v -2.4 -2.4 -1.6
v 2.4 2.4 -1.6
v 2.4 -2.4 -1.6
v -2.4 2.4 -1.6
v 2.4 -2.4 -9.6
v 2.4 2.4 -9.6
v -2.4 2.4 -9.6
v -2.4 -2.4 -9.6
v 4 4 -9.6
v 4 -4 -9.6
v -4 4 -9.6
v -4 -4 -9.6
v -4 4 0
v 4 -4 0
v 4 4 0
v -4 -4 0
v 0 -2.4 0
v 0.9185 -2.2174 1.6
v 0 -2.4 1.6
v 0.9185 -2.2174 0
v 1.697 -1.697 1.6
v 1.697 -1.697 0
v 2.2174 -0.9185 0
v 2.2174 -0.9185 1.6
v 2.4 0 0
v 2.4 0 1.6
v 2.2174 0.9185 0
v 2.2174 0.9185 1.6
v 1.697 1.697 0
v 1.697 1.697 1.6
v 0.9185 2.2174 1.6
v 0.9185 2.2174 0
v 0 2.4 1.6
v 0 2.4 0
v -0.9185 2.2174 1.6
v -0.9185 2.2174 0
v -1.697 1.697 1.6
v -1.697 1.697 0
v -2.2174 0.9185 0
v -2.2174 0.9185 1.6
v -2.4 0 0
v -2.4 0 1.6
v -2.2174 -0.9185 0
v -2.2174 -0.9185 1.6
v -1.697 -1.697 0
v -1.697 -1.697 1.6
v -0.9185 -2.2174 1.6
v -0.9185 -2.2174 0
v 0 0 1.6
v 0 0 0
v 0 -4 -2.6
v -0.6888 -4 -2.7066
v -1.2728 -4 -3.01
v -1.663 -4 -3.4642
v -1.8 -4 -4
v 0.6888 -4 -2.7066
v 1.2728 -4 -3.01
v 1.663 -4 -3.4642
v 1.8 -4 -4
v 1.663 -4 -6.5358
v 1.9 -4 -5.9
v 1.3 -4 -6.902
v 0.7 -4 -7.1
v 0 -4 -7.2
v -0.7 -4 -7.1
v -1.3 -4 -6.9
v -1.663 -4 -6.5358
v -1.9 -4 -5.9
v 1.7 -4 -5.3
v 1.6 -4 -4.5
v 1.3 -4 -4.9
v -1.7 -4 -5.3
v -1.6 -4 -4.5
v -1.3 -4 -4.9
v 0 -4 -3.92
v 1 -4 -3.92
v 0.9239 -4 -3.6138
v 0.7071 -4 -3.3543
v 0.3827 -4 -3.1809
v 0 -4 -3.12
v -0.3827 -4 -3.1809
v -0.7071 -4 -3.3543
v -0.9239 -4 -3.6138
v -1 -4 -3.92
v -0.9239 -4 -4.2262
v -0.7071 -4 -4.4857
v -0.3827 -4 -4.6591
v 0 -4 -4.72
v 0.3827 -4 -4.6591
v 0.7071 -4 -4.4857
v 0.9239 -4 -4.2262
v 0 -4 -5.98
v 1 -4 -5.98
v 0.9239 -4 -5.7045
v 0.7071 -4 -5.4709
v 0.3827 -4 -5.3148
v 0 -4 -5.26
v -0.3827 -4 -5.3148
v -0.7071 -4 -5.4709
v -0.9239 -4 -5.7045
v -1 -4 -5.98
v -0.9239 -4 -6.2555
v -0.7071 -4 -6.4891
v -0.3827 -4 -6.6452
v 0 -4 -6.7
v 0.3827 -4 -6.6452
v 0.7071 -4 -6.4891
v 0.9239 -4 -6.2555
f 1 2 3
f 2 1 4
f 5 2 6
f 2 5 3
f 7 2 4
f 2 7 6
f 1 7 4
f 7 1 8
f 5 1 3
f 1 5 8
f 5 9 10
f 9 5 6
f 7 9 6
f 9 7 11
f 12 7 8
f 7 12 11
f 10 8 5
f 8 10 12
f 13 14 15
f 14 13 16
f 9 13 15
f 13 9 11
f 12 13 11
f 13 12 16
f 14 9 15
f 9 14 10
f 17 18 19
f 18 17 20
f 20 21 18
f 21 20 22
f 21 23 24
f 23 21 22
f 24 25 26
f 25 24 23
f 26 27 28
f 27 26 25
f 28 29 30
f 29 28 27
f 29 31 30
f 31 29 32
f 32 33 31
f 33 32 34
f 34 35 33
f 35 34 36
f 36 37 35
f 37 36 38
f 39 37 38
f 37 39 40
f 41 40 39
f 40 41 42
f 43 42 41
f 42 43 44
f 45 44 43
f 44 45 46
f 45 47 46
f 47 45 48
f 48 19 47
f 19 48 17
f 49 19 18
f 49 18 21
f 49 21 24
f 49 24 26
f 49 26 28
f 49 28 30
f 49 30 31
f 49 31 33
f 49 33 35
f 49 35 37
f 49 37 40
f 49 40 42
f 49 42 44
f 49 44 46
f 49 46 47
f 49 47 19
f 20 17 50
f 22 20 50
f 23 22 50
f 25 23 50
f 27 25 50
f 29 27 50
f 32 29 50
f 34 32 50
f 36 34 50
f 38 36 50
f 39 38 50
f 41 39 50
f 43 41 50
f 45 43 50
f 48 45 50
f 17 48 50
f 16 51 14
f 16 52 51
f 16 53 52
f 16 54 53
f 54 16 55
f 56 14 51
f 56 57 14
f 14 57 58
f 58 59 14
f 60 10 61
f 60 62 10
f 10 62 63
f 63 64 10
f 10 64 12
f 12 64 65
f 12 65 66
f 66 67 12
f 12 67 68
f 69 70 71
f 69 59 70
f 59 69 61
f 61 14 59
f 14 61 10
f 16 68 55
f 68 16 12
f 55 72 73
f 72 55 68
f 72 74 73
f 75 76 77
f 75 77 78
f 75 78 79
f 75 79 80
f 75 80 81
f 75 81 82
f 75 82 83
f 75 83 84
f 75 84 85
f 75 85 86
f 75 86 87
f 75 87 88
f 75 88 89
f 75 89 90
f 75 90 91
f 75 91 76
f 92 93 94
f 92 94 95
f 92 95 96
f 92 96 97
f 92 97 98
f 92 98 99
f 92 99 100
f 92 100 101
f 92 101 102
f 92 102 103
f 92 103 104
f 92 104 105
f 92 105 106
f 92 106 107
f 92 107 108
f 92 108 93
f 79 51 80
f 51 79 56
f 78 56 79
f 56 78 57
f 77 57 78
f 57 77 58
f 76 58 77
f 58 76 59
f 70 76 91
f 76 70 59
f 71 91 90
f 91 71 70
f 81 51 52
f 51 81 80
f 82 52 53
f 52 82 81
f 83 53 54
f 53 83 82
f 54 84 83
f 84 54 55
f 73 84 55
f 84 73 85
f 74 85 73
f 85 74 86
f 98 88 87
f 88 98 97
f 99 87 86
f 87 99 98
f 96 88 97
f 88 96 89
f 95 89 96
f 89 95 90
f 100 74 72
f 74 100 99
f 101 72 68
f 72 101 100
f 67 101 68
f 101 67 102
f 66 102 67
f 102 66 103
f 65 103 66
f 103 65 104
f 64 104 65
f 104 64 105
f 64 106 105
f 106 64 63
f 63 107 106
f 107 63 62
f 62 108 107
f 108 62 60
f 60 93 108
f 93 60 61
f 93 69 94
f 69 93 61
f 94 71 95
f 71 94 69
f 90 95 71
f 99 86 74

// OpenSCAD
// file: ../p/4-4edge.scad
use <../lib.scad>
function ldraw_lib__4_4edge() = [
// 0 Circle 1.0
// 0 Name: 4-4edge.dat
// 0 Author: James Jessiman
// 0 !LDRAW_ORG Primitive UPDATE 2017-01
// 0 !LICENSE Licensed under CC BY 2.0 and CC BY 4.0 : see CAreadme.txt
// 
// 0 BFC CERTIFY CCW
  [0,"BFC","CERTIFY"],
  [0,"BFC","CCW"],
// 
// 0 !HISTORY 1998-12-15 [PTadmin] Official Update 1998-10
// 0 !HISTORY 2005-12-28 [PTadmin] Official Update 2005-01
// 0 !HISTORY 2007-06-24 [PTadmin] Header formatted for Contributor Agreement
// 0 !HISTORY 2008-07-01 [PTadmin] Official Update 2008-01
// 0 !HISTORY 2017-01-15 [Steffen] BFCed
// 0 !HISTORY 2017-12-30 [PTadmin] Official Update 2017-01
// 
// 
// 2 24 1 0 0 0.9239 0 0.3827
  [2,24,1,0,0,0.9239,0,0.3827],
// 2 24 0.9239 0 0.3827 0.7071 0 0.7071
  [2,24,0.9239,0,0.3827,0.7071,0,0.7071],
// 2 24 0.7071 0 0.7071 0.3827 0 0.9239
  [2,24,0.7071,0,0.7071,0.3827,0,0.9239],
// 2 24 0.3827 0 0.9239 0 0 1
  [2,24,0.3827,0,0.9239,0,0,1],
// 2 24 0 0 1 -0.3827 0 0.9239
  [2,24,0,0,1,-0.3827,0,0.9239],
// 2 24 -0.3827 0 0.9239 -0.7071 0 0.7071
  [2,24,-0.3827,0,0.9239,-0.7071,0,0.7071],
// 2 24 -0.7071 0 0.7071 -0.9239 0 0.3827
  [2,24,-0.7071,0,0.7071,-0.9239,0,0.3827],
// 2 24 -0.9239 0 0.3827 -1 0 -0
  [2,24,-0.9239,0,0.3827,-1,0,-0],
// 2 24 -1 0 -0 -0.9239 0 -0.3827
  [2,24,-1,0,-0,-0.9239,0,-0.3827],
// 2 24 -0.9239 0 -0.3827 -0.7071 0 -0.7071
  [2,24,-0.9239,0,-0.3827,-0.7071,0,-0.7071],
// 2 24 -0.7071 0 -0.7071 -0.3827 0 -0.9239
  [2,24,-0.7071,0,-0.7071,-0.3827,0,-0.9239],
// 2 24 -0.3827 0 -0.9239 0 0 -1
  [2,24,-0.3827,0,-0.9239,0,0,-1],
// 2 24 0 0 -1 0.3827 0 -0.9239
  [2,24,0,0,-1,0.3827,0,-0.9239],
// 2 24 0.3827 0 -0.9239 0.7071 0 -0.7071
  [2,24,0.3827,0,-0.9239,0.7071,0,-0.7071],
// 2 24 0.7071 0 -0.7071 0.9239 0 -0.3827
  [2,24,0.7071,0,-0.7071,0.9239,0,-0.3827],
// 2 24 0.9239 0 -0.3827 1 0 0
  [2,24,0.9239,0,-0.3827,1,0,0],
];
module ldraw_lib__4_4edge(step=0, col=false, unit=2/5, alt=false, line=0.2, solid=!$preview)
    makepoly(ldraw_lib__4_4edge(), step=step, col=col, unit=unit, alt=alt, line=line, solid=solid);
ldraw_lib__4_4edge(line=0.2);
// file: ../p/4-4cyli.scad
use <../lib.scad>
$fa=1; $fs=0.2;
function ldraw_lib__4_4cyli(realsolid=false) = [
// 0 Cylinder 1.0
// 0 Name: 4-4cyli.dat
// 0 Author: James Jessiman
// 0 !LDRAW_ORG Primitive UPDATE 2005-01
// 0 !LICENSE Licensed under CC BY 2.0 and CC BY 4.0 : see CAreadme.txt
// 
// 0 BFC CERTIFY CCW
  [0,"BFC","CERTIFY"],
  [0,"BFC","CCW"],
// 
// 0 !HISTORY 1998-12-15 [PTadmin] Official Update 1998-10
// 0 !HISTORY 2002-03-23 [sbliss] Added BFC statement; merged headers from files in distributions LDraw 0.27 and Complete.
// 0 !HISTORY 2002-04-25 [PTadmin] Official Update 2002-02
// 0 !HISTORY 2004-12-14 [guyvivan] BFC CCW
// 0 !HISTORY 2005-12-28 [PTadmin] Official Update 2005-01
// 0 !HISTORY 2007-06-24 [PTadmin] Header formatted for Contributor Agreement
// 0 !HISTORY 2008-07-01 [PTadmin] Official Update 2008-01
// 
// 
// 4 16 1 1 0 0.9239 1 0.3827 0.9239 0 0.3827 1 0 0
  [4,16,1,1,0,0.9239,1,0.3827,0.9239,0,0.3827,1,0,0],
// 5 24 1 0 0 1 1 0 0.9239 0 0.3827 0.9239 0 -0.3827
  [5,24,1,0,0,1,1,0,0.9239,0,0.3827,0.9239,0,-0.3827],
// 4 16 0.9239 1 0.3827 0.7071 1 0.7071 0.7071 0 0.7071 0.9239 0 0.3827
  [4,16,0.9239,1,0.3827,0.7071,1,0.7071,0.7071,0,0.7071,0.9239,0,0.3827],
// 5 24 0.9239 0 0.3827 0.9239 1 0.3827 0.7071 0 0.7071 1 0 0
  [5,24,0.9239,0,0.3827,0.9239,1,0.3827,0.7071,0,0.7071,1,0,0],
// 4 16 0.7071 1 0.7071 0.3827 1 0.9239 0.3827 0 0.9239 0.7071 0 0.7071
  [4,16,0.7071,1,0.7071,0.3827,1,0.9239,0.3827,0,0.9239,0.7071,0,0.7071],
// 5 24 0.7071 0 0.7071 0.7071 1 0.7071 0.3827 0 0.9239 0.9239 0 0.3827
  [5,24,0.7071,0,0.7071,0.7071,1,0.7071,0.3827,0,0.9239,0.9239,0,0.3827],
// 4 16 0.3827 1 0.9239 0 1 1 0 0 1 0.3827 0 0.9239
  [4,16,0.3827,1,0.9239,0,1,1,0,0,1,0.3827,0,0.9239],
// 5 24 0.3827 0 0.9239 0.3827 1 0.9239 0 0 1 0.7071 0 0.7071
  [5,24,0.3827,0,0.9239,0.3827,1,0.9239,0,0,1,0.7071,0,0.7071],
// 4 16 0 1 1 -0.3827 1 0.9239 -0.3827 0 0.9239 0 0 1
  [4,16,0,1,1,-0.3827,1,0.9239,-0.3827,0,0.9239,0,0,1],
// 5 24 0 0 1 0 1 1 -0.3827 0 0.9239 0.3827 0 0.9239
  [5,24,0,0,1,0,1,1,-0.3827,0,0.9239,0.3827,0,0.9239],
// 4 16 -0.3827 1 0.9239 -0.7071 1 0.7071 -0.7071 0 0.7071 -0.3827 0 0.9239
  [4,16,-0.3827,1,0.9239,-0.7071,1,0.7071,-0.7071,0,0.7071,-0.3827,0,0.9239],
// 5 24 -0.3827 0 0.9239 -0.3827 1 0.9239 -0.7071 0 0.7071 0 0 1
  [5,24,-0.3827,0,0.9239,-0.3827,1,0.9239,-0.7071,0,0.7071,0,0,1],
// 4 16 -0.7071 1 0.7071 -0.9239 1 0.3827 -0.9239 0 0.3827 -0.7071 0 0.7071
  [4,16,-0.7071,1,0.7071,-0.9239,1,0.3827,-0.9239,0,0.3827,-0.7071,0,0.7071],
// 5 24 -0.7071 0 0.7071 -0.7071 1 0.7071 -0.9239 0 0.3827 -0.3827 0 0.9239
  [5,24,-0.7071,0,0.7071,-0.7071,1,0.7071,-0.9239,0,0.3827,-0.3827,0,0.9239],
// 4 16 -0.9239 1 0.3827 -1 1 0 -1 0 0 -0.9239 0 0.3827
  [4,16,-0.9239,1,0.3827,-1,1,0,-1,0,0,-0.9239,0,0.3827],
// 5 24 -0.9239 0 0.3827 -0.9239 1 0.3827 -1 0 0 -0.7071 0 0.7071
  [5,24,-0.9239,0,0.3827,-0.9239,1,0.3827,-1,0,0,-0.7071,0,0.7071],
// 4 16 -1 1 0 -0.9239 1 -0.3827 -0.9239 0 -0.3827 -1 0 0
  [4,16,-1,1,0,-0.9239,1,-0.3827,-0.9239,0,-0.3827,-1,0,0],
// 5 24 -1 0 0 -1 1 0 -0.9239 0 -0.3827 -0.9239 0 0.3827
  [5,24,-1,0,0,-1,1,0,-0.9239,0,-0.3827,-0.9239,0,0.3827],
// 4 16 -0.9239 1 -0.3827 -0.7071 1 -0.7071 -0.7071 0 -0.7071 -0.9239 0 -0.3827
  [4,16,-0.9239,1,-0.3827,-0.7071,1,-0.7071,-0.7071,0,-0.7071,-0.9239,0,-0.3827],
// 5 24 -0.9239 0 -0.3827 -0.9239 1 -0.3827 -0.7071 0 -0.7071 -1 0 0
  [5,24,-0.9239,0,-0.3827,-0.9239,1,-0.3827,-0.7071,0,-0.7071,-1,0,0],
// 4 16 -0.7071 1 -0.7071 -0.3827 1 -0.9239 -0.3827 0 -0.9239 -0.7071 0 -0.7071
  [4,16,-0.7071,1,-0.7071,-0.3827,1,-0.9239,-0.3827,0,-0.9239,-0.7071,0,-0.7071],
// 5 24 -0.7071 0 -0.7071 -0.7071 1 -0.7071 -0.3827 0 -0.9239 -0.9239 0 -0.3827
  [5,24,-0.7071,0,-0.7071,-0.7071,1,-0.7071,-0.3827,0,-0.9239,-0.9239,0,-0.3827],
// 4 16 -0.3827 1 -0.9239 0 1 -1 0 0 -1 -0.3827 0 -0.9239
  [4,16,-0.3827,1,-0.9239,0,1,-1,0,0,-1,-0.3827,0,-0.9239],
// 5 24 -0.3827 0 -0.9239 -0.3827 1 -0.9239 0 0 -1 -0.7071 0 -0.7071
  [5,24,-0.3827,0,-0.9239,-0.3827,1,-0.9239,0,0,-1,-0.7071,0,-0.7071],
// 4 16 0 1 -1 0.3827 1 -0.9239 0.3827 0 -0.9239 0 0 -1
  [4,16,0,1,-1,0.3827,1,-0.9239,0.3827,0,-0.9239,0,0,-1],
// 5 24 0 0 -1 0 1 -1 0.3827 0 -0.9239 -0.3827 0 -0.9239
  [5,24,0,0,-1,0,1,-1,0.3827,0,-0.9239,-0.3827,0,-0.9239],
// 4 16 0.3827 1 -0.9239 0.7071 1 -0.7071 0.7071 0 -0.7071 0.3827 0 -0.9239
  [4,16,0.3827,1,-0.9239,0.7071,1,-0.7071,0.7071,0,-0.7071,0.3827,0,-0.9239],
// 5 24 0.3827 0 -0.9239 0.3827 1 -0.9239 0.7071 0 -0.7071 0 0 -1
  [5,24,0.3827,0,-0.9239,0.3827,1,-0.9239,0.7071,0,-0.7071,0,0,-1],
// 4 16 0.7071 1 -0.7071 0.9239 1 -0.3827 0.9239 0 -0.3827 0.7071 0 -0.7071
  [4,16,0.7071,1,-0.7071,0.9239,1,-0.3827,0.9239,0,-0.3827,0.7071,0,-0.7071],
// 5 24 0.7071 0 -0.7071 0.7071 1 -0.7071 0.9239 0 -0.3827 0.3827 0 -0.9239
  [5,24,0.7071,0,-0.7071,0.7071,1,-0.7071,0.9239,0,-0.3827,0.3827,0,-0.9239],
// 4 16 0.9239 1 -0.3827 1 1 0 1 0 0 0.9239 0 -0.3827
  [4,16,0.9239,1,-0.3827,1,1,0,1,0,0,0.9239,0,-0.3827],
// 5 24 0.9239 0 -0.3827 0.9239 1 -0.3827 1 0 0 0.7071 0 -0.7071
  [5,24,0.9239,0,-0.3827,0.9239,1,-0.3827,1,0,0,0.7071,0,-0.7071],
// 0
];
module ldraw_lib__4_4cyli(step=0, col=false, unit=2/5, alt=false, line=0.2, solid=!$preview)
    makepoly(ldraw_lib__4_4cyli(solid), step=step, col=col, unit=unit, alt=alt, line=line, solid=solid);
ldraw_lib__4_4cyli(line=0.2);
// file: ../p/stud.scad
use <../lib.scad>
use <4-4cyli.scad>
use <4-4disc.scad>
use <4-4edge.scad>
function ldraw_lib__stud() = [
// 0 Stud
// 0 Name: stud.dat
// 0 Author: James Jessiman
// 0 !LDRAW_ORG Primitive UPDATE 2012-01
// 0 !LICENSE Licensed under CC BY 4.0 : see CAreadme.txt
// 
// 0 BFC CERTIFY CCW
  [0,"BFC","CERTIFY"],
  [0,"BFC","CCW"],
// 
// 0 !HISTORY 2002-04-04 [sbliss] Modified for BFC compliance
// 0 !HISTORY 2002-04-25 [PTadmin] Official Update 2002-02
// 0 !HISTORY 2007-06-24 [PTadmin] Header formatted for Contributor Agreement
// 0 !HISTORY 2008-07-01 [PTadmin] Official Update 2008-01
// 0 !HISTORY 2012-02-16 [Philo] Changed to CCW
// 0 !HISTORY 2012-03-30 [PTadmin] Official Update 2012-01
// 
// 
// 1 16 0 0 0 6 0 0 0 1 0 0 0 6 4-4edge.dat
  [1,16,0,0,0,6,0,0,0,1,0,0,0,6, ldraw_lib__4_4edge()],
// 1 16 0 -4 0 6 0 0 0 1 0 0 0 6 4-4edge.dat
  [1,16,0,-4,0,6,0,0,0,1,0,0,0,6, ldraw_lib__4_4edge()],
// 1 16 0 0 0 6 0 0 0 -4 0 0 0 6 4-4cyli.dat
  [1,16,0,0,0,6,0,0,0,-4,0,0,0,6, ldraw_lib__4_4cyli()],
// 1 16 0 -4 0 6 0 0 0 1 0 0 0 6 4-4disc.dat
  [1,16,0,-4,0,6,0,0,0,1,0,0,0,6, ldraw_lib__4_4disc()],
  [-1,16,0,0,0,6,0,0,0,-1,0,0,0,6, ldraw_lib__4_4disc()],
];
module ldraw_lib__stud(step=0, col=false, unit=2/5, alt=false, line=0.2, solid=!$preview)
    makepoly(ldraw_lib__stud(), step=step, col=col, unit=unit, alt=alt, line=line, solid=solid);
ldraw_lib__stud(line=0.2);
// file: ../p/box5.scad
use <../lib.scad>
function ldraw_lib__box5() = [
// 0 Box with 5 Faces and All Edges
// 0 Name: box5.dat
// 0 Author: James Jessiman
// 0 !LDRAW_ORG Primitive UPDATE 2012-01
// 0 !LICENSE Licensed under CC BY 2.0 and CC BY 4.0 : see CAreadme.txt
// 
// 0 BFC CERTIFY CCW
  [0,"BFC","CERTIFY"],
  [0,"BFC","CCW"],
// 
// 0 !HISTORY 2002-04-03 [sbliss] Modified for BFC compliance
// 0 !HISTORY 2002-04-25 [PTadmin] Official Update 2002-02
// 0 !HISTORY 2007-06-24 [PTadmin] Header formatted for Contributor Agreement
// 0 !HISTORY 2008-07-01 [PTadmin] Official Update 2008-01
// 0 !HISTORY 2012-02-16 [Philo] Changed to CCW
// 0 !HISTORY 2012-03-30 [PTadmin] Official Update 2012-01
// 
// 
// 2 24 1 1 1 -1 1 1
  [2,24,1,1,1,-1,1,1],
// 2 24 -1 1 1 -1 1 -1
  [2,24,-1,1,1,-1,1,-1],
// 2 24 -1 1 -1 1 1 -1
  [2,24,-1,1,-1,1,1,-1],
// 2 24 1 1 -1 1 1 1
  [2,24,1,1,-1,1,1,1],
// 2 24 1 0 1 -1 0 1
  [2,24,1,0,1,-1,0,1],
// 2 24 -1 0 1 -1 0 -1
  [2,24,-1,0,1,-1,0,-1],
// 2 24 -1 0 -1 1 0 -1
  [2,24,-1,0,-1,1,0,-1],
// 2 24 1 0 -1 1 0 1
  [2,24,1,0,-1,1,0,1],
// 2 24 1 0 1 1 1 1
  [2,24,1,0,1,1,1,1],
// 2 24 -1 0 1 -1 1 1
  [2,24,-1,0,1,-1,1,1],
// 2 24 1 0 -1 1 1 -1
  [2,24,1,0,-1,1,1,-1],
// 2 24 -1 0 -1 -1 1 -1
  [2,24,-1,0,-1,-1,1,-1],
// 4 16 -1 1 1 1 1 1 1 1 -1 -1 1 -1
  [4,16,-1,1,1,1,1,1,1,1,-1,-1,1,-1],
// 4 16 -1 1 1 -1 0 1 1 0 1 1 1 1
  [4,16,-1,1,1,-1,0,1,1,0,1,1,1,1],
// 4 16 -1 1 -1 -1 0 -1 -1 0 1 -1 1 1
  [4,16,-1,1,-1,-1,0,-1,-1,0,1,-1,1,1],
// 4 16 1 1 -1 1 0 -1 -1 0 -1 -1 1 -1
  [4,16,1,1,-1,1,0,-1,-1,0,-1,-1,1,-1],
// 4 16 1 1 1 1 0 1 1 0 -1 1 1 -1
  [4,16,1,1,1,1,0,1,1,0,-1,1,1,-1],
];
makepoly(ldraw_lib__box5(), line=0.2);
// file: ../p/box4t.scad
use <../lib.scad>
function ldraw_lib__box4t() = [
// 0 Box with 4 Adjacent Faces and All Edges
// 0 Name: box4t.dat
// 0 Author: Tore Eriksson [Tore_Eriksson]
// 0 !LDRAW_ORG Primitive UPDATE 2003-02
// 0 !LICENSE Licensed under CC BY 2.0 and CC BY 4.0 : see CAreadme.txt
// 
// 0 BFC CERTIFY CCW
  [0,"BFC","CERTIFY"],
  [0,"BFC","CCW"],
// 
// 0 !HISTORY 1997-09-29 [PTadmin] Official Update 1997-15
// 0 !HISTORY 2002-08-31 [izanette] Modified with WINDZ for BFC compliance
// 0 !HISTORY 2003-08-01 [PTadmin] Official Update 2003-02
// 0 !HISTORY 2007-06-24 [PTadmin] Header formatted for Contributor Agreement
// 0 !HISTORY 2008-07-01 [PTadmin] Official Update 2008-01
// 
// 
// 2 24 1 1 1 -1 1 1
  [2,24,1,1,1,-1,1,1],
// 2 24 -1 1 1 -1 1 -1
  [2,24,-1,1,1,-1,1,-1],
// 2 24 -1 1 -1 1 1 -1
  [2,24,-1,1,-1,1,1,-1],
// 2 24 1 1 -1 1 1 1
  [2,24,1,1,-1,1,1,1],
// 2 24 1 0 1 -1 0 1
  [2,24,1,0,1,-1,0,1],
// 2 24 -1 0 1 -1 0 -1
  [2,24,-1,0,1,-1,0,-1],
// 2 24 -1 0 -1 1 0 -1
  [2,24,-1,0,-1,1,0,-1],
// 2 24 1 0 -1 1 0 1
  [2,24,1,0,-1,1,0,1],
// 2 24 1 0 1 1 1 1
  [2,24,1,0,1,1,1,1],
// 2 24 -1 0 1 -1 1 1
  [2,24,-1,0,1,-1,1,1],
// 2 24 1 0 -1 1 1 -1
  [2,24,1,0,-1,1,1,-1],
// 2 24 -1 0 -1 -1 1 -1
  [2,24,-1,0,-1,-1,1,-1],
// 4 16 1 1 1 1 1 -1 -1 1 -1 -1 1 1
  [4,16,1,1,1,1,1,-1,-1,1,-1,-1,1,1],
// 4 16 1 1 1 -1 1 1 -1 0 1 1 0 1
  [4,16,1,1,1,-1,1,1,-1,0,1,1,0,1],
// 4 16 -1 1 1 -1 1 -1 -1 0 -1 -1 0 1
  [4,16,-1,1,1,-1,1,-1,-1,0,-1,-1,0,1],
// 0 4 16 -1 1 -1 -1 0 -1 1 0 -1 1 1 -1
// 4 16 1 1 -1 1 1 1 1 0 1 1 0 -1
  [4,16,1,1,-1,1,1,1,1,0,1,1,0,-1],
// 0
];
makepoly(ldraw_lib__box4t(), line=0.2);
// file: s/3005s01.scad
use <../../lib.scad>
use <../../p/box4t.scad>
use <../../p/box5.scad>
use <../../p/stud.scad>
function ldraw_lib__s__3005s01() = [
// 0 ~Brick  1 x  1 without Front Face
// 0 Name: s\3005s01.dat
// 0 Author: John Riley [jriley]
// 0 !LDRAW_ORG Subpart UPDATE 2004-01
// 0 !LICENSE Licensed under CC BY 2.0 and CC BY 4.0 : see CAreadme.txt
// 
// 0 BFC CERTIFY CCW
  [0,"BFC","CERTIFY"],
  [0,"BFC","CCW"],
// 
// 0 !HISTORY 2003-09-07 [jriley] BFCed & Subfiled
// 0 !HISTORY 2004-03-02 [PTadmin] Official Update 2004-01
// 0 !HISTORY 2007-08-29 [PTadmin] Header formatted for Contributor Agreement
// 0 !HISTORY 2008-07-01 [PTadmin] Official Update 2008-01
// 
// 
// 0 BFC INVERTNEXT
  [0,"BFC","INVERTNEXT"],
// 1 16 0 24 0 0 0 6 0 -20 0 -6 0 0 box5.dat
  [1,16,0,24,0,0,0,6,0,-20,0,-6,0,0, ldraw_lib__box5()],
// 4 16 10 24 -10 6 24 -6 6 24 6 10 24 10
  [4,16,10,24,-10,6,24,-6,6,24,6,10,24,10],
// 4 16 10 24 10 6 24 6 -6 24 6 -10 24 10
  [4,16,10,24,10,6,24,6,-6,24,6,-10,24,10],
// 4 16 -10 24 10 -6 24 6 -6 24 -6 -10 24 -10
  [4,16,-10,24,10,-6,24,6,-6,24,-6,-10,24,-10],
// 4 16 -10 24 -10 -6 24 -6 6 24 -6 10 24 -10
  [4,16,-10,24,-10,-6,24,-6,6,24,-6,10,24,-10],
// 1 16 0 24 0 10 0 0 0 -24 0 0 0 10 box4t.dat
  [1,16,0,24,0,10,0,0,0,-24,0,0,0,10, ldraw_lib__box4t()],
// 1 16 0 0 0 0 0 1 0 1 0 -1 0 0 stud.dat
  [1,16,0,0,0,0,0,1,0,1,0,-1,0,0, ldraw_lib__stud()],
// 0
];
module ldraw_lib__s__3005s01(step=0, col=false, unit=2/5, alt=false, line=0.2, solid=!$preview)
    makepoly(ldraw_lib__s__3005s01(), step=step, col=col, unit=unit, alt=alt, line=line, solid=solid);
ldraw_lib__s__3005s01(line=0.2);
// file: ../p/4-4disc.scad
use <../lib.scad>
function ldraw_lib__4_4disc() = [
// 0 Disc 1.0
// 0 Name: 4-4disc.dat
// 0 Author: James Jessiman
// 0 !LDRAW_ORG Primitive UPDATE 2002-02
// 0 !LICENSE Licensed under CC BY 2.0 and CC BY 4.0 : see CAreadme.txt
// 
// 0 BFC CERTIFY CCW
  [0,"BFC","CERTIFY"],
  [0,"BFC","CCW"],
// 
// 0 !HISTORY 1998-12-15 [PTadmin] Official Update 1998-10
// 0 !HISTORY 2002-03-23 [sbliss] Added BFC statement
// 0 !HISTORY 2002-04-25 [PTadmin] Official Update 2002-02
// 0 !HISTORY 2007-06-24 [PTadmin] Header formatted for Contributor Agreement
// 0 !HISTORY 2008-07-01 [PTadmin] Official Update 2008-01
// 
// 
// 3 16 0 0 0 1 0 0 0.9239 0 0.3827
  [3,16,0,0,0,1,0,0,0.9239,0,0.3827],
// 3 16 0 0 0 0.9239 0 0.3827 0.7071 0 0.7071
  [3,16,0,0,0,0.9239,0,0.3827,0.7071,0,0.7071],
// 3 16 0 0 0 0.7071 0 0.7071 0.3827 0 0.9239
  [3,16,0,0,0,0.7071,0,0.7071,0.3827,0,0.9239],
// 3 16 0 0 0 0.3827 0 0.9239 0 0 1
  [3,16,0,0,0,0.3827,0,0.9239,0,0,1],
// 3 16 0 0 0 0 0 1 -0.3827 0 0.9239
  [3,16,0,0,0,0,0,1,-0.3827,0,0.9239],
// 3 16 0 0 0 -0.3827 0 0.9239 -0.7071 0 0.7071
  [3,16,0,0,0,-0.3827,0,0.9239,-0.7071,0,0.7071],
// 3 16 0 0 0 -0.7071 0 0.7071 -0.9239 0 0.3827
  [3,16,0,0,0,-0.7071,0,0.7071,-0.9239,0,0.3827],
// 3 16 0 0 0 -0.9239 0 0.3827 -1 0 -0
  [3,16,0,0,0,-0.9239,0,0.3827,-1,0,-0],
// 3 16 0 0 0 -1 0 -0 -0.9239 0 -0.3827
  [3,16,0,0,0,-1,0,-0,-0.9239,0,-0.3827],
// 3 16 0 0 0 -0.9239 0 -0.3827 -0.7071 0 -0.7071
  [3,16,0,0,0,-0.9239,0,-0.3827,-0.7071,0,-0.7071],
// 3 16 0 0 0 -0.7071 0 -0.7071 -0.3827 0 -0.9239
  [3,16,0,0,0,-0.7071,0,-0.7071,-0.3827,0,-0.9239],
// 3 16 0 0 0 -0.3827 0 -0.9239 0 0 -1
  [3,16,0,0,0,-0.3827,0,-0.9239,0,0,-1],
// 3 16 0 0 0 0 0 -1 0.3827 0 -0.9239
  [3,16,0,0,0,0,0,-1,0.3827,0,-0.9239],
// 3 16 0 0 0 0.3827 0 -0.9239 0.7071 0 -0.7071
  [3,16,0,0,0,0.3827,0,-0.9239,0.7071,0,-0.7071],
// 3 16 0 0 0 0.7071 0 -0.7071 0.9239 0 -0.3827
  [3,16,0,0,0,0.7071,0,-0.7071,0.9239,0,-0.3827],
// 3 16 0 0 0 0.9239 0 -0.3827 1 0 0
  [3,16,0,0,0,0.9239,0,-0.3827,1,0,0],
// 0
];
module ldraw_lib__4_4disc(step=0, col=false, unit=2/5, alt=false, line=0.2, solid=!$preview)
    makepoly(ldraw_lib__4_4disc(), step=step, col=col, unit=unit, alt=alt, line=line, solid=solid);
ldraw_lib__4_4disc(line=0.2);
// main file
use <../lib.scad>
use <../p/4-4disc.scad>
use <s/3005s01.scad>
function ldraw_lib__3005pt8() = [
// 0 Brick  1 x  1 with Blue "8" Pattern
// 0 Name: 3005pt8.dat
// 0 Author: Michael Heidemann [mikeheide]
// 0 !LDRAW_ORG Part UPDATE 2011-01
// 0 !LICENSE Licensed under CC BY 4.0 : see CAreadme.txt
// 
// 0 BFC CERTIFY CCW
  [0,"BFC","CERTIFY"],
  [0,"BFC","CCW"],
// 
// 0 !KEYWORDS Rebrickable 3005pr9975, Set 237
// 
// 0 !HISTORY 2011-07-25 [PTadmin] Official Update 2011-01
// 
// 
// 1 16 0 0 0 1 0 0 0 1 0 0 0 1 s\3005s01.dat
  [1,16,0,0,0,1,0,0,0,1,0,0,0,1, ldraw_lib__s__3005s01()],
// 3 16 -10 0 -10 0 6.5 -10 10 0 -10
  [3,16,-10,0,-10,0,6.5,-10,10,0,-10],
// 3 16 -10 0 -10 -1.7221 6.7664 -10 0 6.5 -10
  [3,16,-10,0,-10,-1.7221,6.7664,-10,0,6.5,-10],
// 3 16 -10 0 -10 -3.182 7.5251 -10 -1.7221 6.7664 -10
  [3,16,-10,0,-10,-3.182,7.5251,-10,-1.7221,6.7664,-10],
// 3 16 -10 0 -10 -4.1575 8.6606 -10 -3.182 7.5251 -10
  [3,16,-10,0,-10,-4.1575,8.6606,-10,-3.182,7.5251,-10],
// 3 16 -4.1575 8.6606 -10 -10 0 -10 -4.5 10 -10
  [3,16,-4.1575,8.6606,-10,-10,0,-10,-4.5,10,-10],
// 3 16 1.7221 6.7664 -10 10 0 -10 0 6.5 -10
  [3,16,1.7221,6.7664,-10,10,0,-10,0,6.5,-10],
// 3 16 1.7221 6.7664 -10 3.182 7.5251 -10 10 0 -10
  [3,16,1.7221,6.7664,-10,3.182,7.5251,-10,10,0,-10],
// 3 16 10 0 -10 3.182 7.5251 -10 4.1575 8.6606 -10
  [3,16,10,0,-10,3.182,7.5251,-10,4.1575,8.6606,-10],
// 3 16 4.1575 8.6606 -10 4.5 10 -10 10 0 -10
  [3,16,4.1575,8.6606,-10,4.5,10,-10,10,0,-10],
// 3 16 4.1575 16.3394 -10 10 24 -10 4.75 14.75 -10
  [3,16,4.1575,16.3394,-10,10,24,-10,4.75,14.75,-10],
// 3 16 4.1575 16.3394 -10 3.25 17.2549 -10 10 24 -10
  [3,16,4.1575,16.3394,-10,3.25,17.2549,-10,10,24,-10],
// 3 16 10 24 -10 3.25 17.2549 -10 1.75 17.75 -10
  [3,16,10,24,-10,3.25,17.2549,-10,1.75,17.75,-10],
// 3 16 1.75 17.75 -10 0 18 -10 10 24 -10
  [3,16,1.75,17.75,-10,0,18,-10,10,24,-10],
// 3 16 10 24 -10 0 18 -10 -10 24 -10
  [3,16,10,24,-10,0,18,-10,-10,24,-10],
// 3 16 -10 24 -10 0 18 -10 -1.75 17.75 -10
  [3,16,-10,24,-10,0,18,-10,-1.75,17.75,-10],
// 3 16 -10 24 -10 -1.75 17.75 -10 -3.25 17.25 -10
  [3,16,-10,24,-10,-1.75,17.75,-10,-3.25,17.25,-10],
// 3 16 -3.25 17.25 -10 -4.1575 16.3394 -10 -10 24 -10
  [3,16,-3.25,17.25,-10,-4.1575,16.3394,-10,-10,24,-10],
// 3 16 -10 24 -10 -4.1575 16.3394 -10 -4.75 14.75 -10
  [3,16,-10,24,-10,-4.1575,16.3394,-10,-4.75,14.75,-10],
// 3 16 4.25 13.25 -10 4 11.25 -10 3.25 12.25 -10
  [3,16,4.25,13.25,-10,4,11.25,-10,3.25,12.25,-10],
// 4 16 4.5 10 -10 4 11.25 -10 4.25 13.25 -10 4.75 14.75 -10
  [4,16,4.5,10,-10,4,11.25,-10,4.25,13.25,-10,4.75,14.75,-10],
// 4 16 10 0 -10 4.5 10 -10 4.75 14.75 -10 10 24 -10
  [4,16,10,0,-10,4.5,10,-10,4.75,14.75,-10,10,24,-10],
// 4 16 -4.75 14.75 -10 -4.5 10 -10 -10 0 -10 -10 24 -10
  [4,16,-4.75,14.75,-10,-4.5,10,-10,-10,0,-10,-10,24,-10],
// 4 16 -4.25 13.25 -10 -4 11.25 -10 -4.5 10 -10 -4.75 14.75 -10
  [4,16,-4.25,13.25,-10,-4,11.25,-10,-4.5,10,-10,-4.75,14.75,-10],
// 3 16 -4.25 13.25 -10 -3.25 12.25 -10 -4 11.25 -10
  [3,16,-4.25,13.25,-10,-3.25,12.25,-10,-4,11.25,-10],
// 1 16 0 9.8 -10 2.5 0 0 0 0 -2 0 2 0 4-4disc.dat
  [1,16,0,9.8,-10,2.5,0,0,0,0,-2,0,2,0, ldraw_lib__4_4disc()],
// 1 16 0 14.95 -10 2.5 0 0 0 0 -1.8 0 1.8 0 4-4disc.dat
  [1,16,0,14.95,-10,2.5,0,0,0,0,-1.8,0,1.8,0, ldraw_lib__4_4disc()],
// 4 1 0 6.5 -10 0 7.8 -10 .9567 7.9522 -10 1.7221 6.7664 -10
  [4,1,0,6.5,-10,0,7.8,-10,.9567,7.9522,-10,1.7221,6.7664,-10],
// 4 1 1.7678 8.3858 -10 3.182 7.5251 -10 1.7221 6.7664 -10 .9567 7.9522 -10
  [4,1,1.7678,8.3858,-10,3.182,7.5251,-10,1.7221,6.7664,-10,.9567,7.9522,-10],
// 4 1 1.7678 8.3858 -10 2.3097 9.0346 -10 4.1575 8.6606 -10 3.182 7.5251 -10
  [4,1,1.7678,8.3858,-10,2.3097,9.0346,-10,4.1575,8.6606,-10,3.182,7.5251,-10],
// 4 1 2.3097 9.0346 -10 2.5 9.8 -10 4.5 10 -10 4.1575 8.6606 -10
  [4,1,2.3097,9.0346,-10,2.5,9.8,-10,4.5,10,-10,4.1575,8.6606,-10],
// 4 1 2.5 9.8 -10 2.3097 10.5654 -10 4 11.25 -10 4.5 10 -10
  [4,1,2.5,9.8,-10,2.3097,10.5654,-10,4,11.25,-10,4.5,10,-10],
// 4 1 4 11.25 -10 2.3097 10.5654 -10 1.7678 11.2142 -10 3.25 12.25 -10
  [4,1,4,11.25,-10,2.3097,10.5654,-10,1.7678,11.2142,-10,3.25,12.25,-10],
// 4 1 0 7.8 -10 0 6.5 -10 -1.7221 6.7664 -10 -.9567 7.9522 -10
  [4,1,0,7.8,-10,0,6.5,-10,-1.7221,6.7664,-10,-.9567,7.9522,-10],
// 4 1 -3.182 7.5251 -10 -1.7678 8.3858 -10 -.9567 7.9522 -10 -1.7221 6.7664 -10
  [4,1,-3.182,7.5251,-10,-1.7678,8.3858,-10,-.9567,7.9522,-10,-1.7221,6.7664,-10],
// 4 1 -3.182 7.5251 -10 -4.1575 8.6606 -10 -2.3097 9.0346 -10 -1.7678 8.3858 -10
  [4,1,-3.182,7.5251,-10,-4.1575,8.6606,-10,-2.3097,9.0346,-10,-1.7678,8.3858,-10],
// 4 1 -4.5 10 -10 -2.5 9.8 -10 -2.3097 9.0346 -10 -4.1575 8.6606 -10
  [4,1,-4.5,10,-10,-2.5,9.8,-10,-2.3097,9.0346,-10,-4.1575,8.6606,-10],
// 4 1 -4.5 10 -10 -4 11.25 -10 -2.3097 10.5654 -10 -2.5 9.8 -10
  [4,1,-4.5,10,-10,-4,11.25,-10,-2.3097,10.5654,-10,-2.5,9.8,-10],
// 4 1 -4 11.25 -10 -3.25 12.25 -10 -1.7678 11.2142 -10 -2.3097 10.5654 -10
  [4,1,-4,11.25,-10,-3.25,12.25,-10,-1.7678,11.2142,-10,-2.3097,10.5654,-10],
// 4 1 -.9567 13.287 -10 0 13.15 -10 0 11.8 -10 -.9567 11.6478 -10
  [4,1,-.9567,13.287,-10,0,13.15,-10,0,11.8,-10,-.9567,11.6478,-10],
// 4 1 -.9567 11.6478 -10 -1.7678 11.2142 -10 -1.7678 13.6772 -10 -.9567 13.287 -10
  [4,1,-.9567,11.6478,-10,-1.7678,11.2142,-10,-1.7678,13.6772,-10,-.9567,13.287,-10],
// 4 1 .9567 13.287 -10 .9567 11.6478 -10 0 11.8 -10 0 13.15 -10
  [4,1,.9567,13.287,-10,.9567,11.6478,-10,0,11.8,-10,0,13.15,-10],
// 4 1 1.7678 13.6772 -10 1.7678 11.2142 -10 .9567 11.6478 -10 .9567 13.287 -10
  [4,1,1.7678,13.6772,-10,1.7678,11.2142,-10,.9567,11.6478,-10,.9567,13.287,-10],
// 4 1 -2.3097 14.2612 -10 -1.7678 13.6772 -10 -3.25 12.25 -10 -4.25 13.25 -10
  [4,1,-2.3097,14.2612,-10,-1.7678,13.6772,-10,-3.25,12.25,-10,-4.25,13.25,-10],
// 4 1 -4.25 13.25 -10 -4.75 14.75 -10 -2.5 14.95 -10 -2.3097 14.2612 -10
  [4,1,-4.25,13.25,-10,-4.75,14.75,-10,-2.5,14.95,-10,-2.3097,14.2612,-10],
// 4 1 -2.5 14.95 -10 -4.75 14.75 -10 -4.1575 16.3394 -10 -2.3097 15.6388 -10
  [4,1,-2.5,14.95,-10,-4.75,14.75,-10,-4.1575,16.3394,-10,-2.3097,15.6388,-10],
// 4 1 -3.25 17.25 -10 -1.7678 16.2228 -10 -2.3097 15.6388 -10 -4.1575 16.3394 -10
  [4,1,-3.25,17.25,-10,-1.7678,16.2228,-10,-2.3097,15.6388,-10,-4.1575,16.3394,-10],
// 4 1 -3.25 17.25 -10 -1.75 17.75 -10 -.9567 16.613 -10 -1.7678 16.2228 -10
  [4,1,-3.25,17.25,-10,-1.75,17.75,-10,-.9567,16.613,-10,-1.7678,16.2228,-10],
// 4 1 0 18 -10 0 16.75 -10 -.9567 16.613 -10 -1.75 17.75 -10
  [4,1,0,18,-10,0,16.75,-10,-.9567,16.613,-10,-1.75,17.75,-10],
// 4 1 0 18 -10 1.75 17.75 -10 .9567 16.613 -10 0 16.75 -10
  [4,1,0,18,-10,1.75,17.75,-10,.9567,16.613,-10,0,16.75,-10],
// 4 1 3.25 17.2549 -10 1.7678 16.2228 -10 .9567 16.613 -10 1.75 17.75 -10
  [4,1,3.25,17.2549,-10,1.7678,16.2228,-10,.9567,16.613,-10,1.75,17.75,-10],
// 4 1 4.1575 16.3394 -10 2.3097 15.6388 -10 1.7678 16.2228 -10 3.25 17.2549 -10
  [4,1,4.1575,16.3394,-10,2.3097,15.6388,-10,1.7678,16.2228,-10,3.25,17.2549,-10],
// 4 1 4.75 14.75 -10 2.5 14.95 -10 2.3097 15.6388 -10 4.1575 16.3394 -10
  [4,1,4.75,14.75,-10,2.5,14.95,-10,2.3097,15.6388,-10,4.1575,16.3394,-10],
// 4 1 2.3097 14.2612 -10 2.5 14.95 -10 4.75 14.75 -10 4.25 13.25 -10
  [4,1,2.3097,14.2612,-10,2.5,14.95,-10,4.75,14.75,-10,4.25,13.25,-10],
// 4 1 1.7678 13.6772 -10 2.3097 14.2612 -10 4.25 13.25 -10 3.25 12.25 -10
  [4,1,1.7678,13.6772,-10,2.3097,14.2612,-10,4.25,13.25,-10,3.25,12.25,-10],
// 3 1 1.7678 11.2142 -10 1.7678 13.6772 -10 3.25 12.25 -10
  [3,1,1.7678,11.2142,-10,1.7678,13.6772,-10,3.25,12.25,-10],
// 3 1 -1.7678 13.6772 -10 -1.7678 11.2142 -10 -3.25 12.25 -10
  [3,1,-1.7678,13.6772,-10,-1.7678,11.2142,-10,-3.25,12.25,-10],
];
module ldraw_lib__3005pt8(step=0, col=false, unit=2/5, alt=false, line=0.2, solid=!$preview)
    makepoly(ldraw_lib__3005pt8(), step=step, col=col, unit=unit, alt=alt, line=line, solid=solid);
ldraw_lib__3005pt8(line=0.2);
